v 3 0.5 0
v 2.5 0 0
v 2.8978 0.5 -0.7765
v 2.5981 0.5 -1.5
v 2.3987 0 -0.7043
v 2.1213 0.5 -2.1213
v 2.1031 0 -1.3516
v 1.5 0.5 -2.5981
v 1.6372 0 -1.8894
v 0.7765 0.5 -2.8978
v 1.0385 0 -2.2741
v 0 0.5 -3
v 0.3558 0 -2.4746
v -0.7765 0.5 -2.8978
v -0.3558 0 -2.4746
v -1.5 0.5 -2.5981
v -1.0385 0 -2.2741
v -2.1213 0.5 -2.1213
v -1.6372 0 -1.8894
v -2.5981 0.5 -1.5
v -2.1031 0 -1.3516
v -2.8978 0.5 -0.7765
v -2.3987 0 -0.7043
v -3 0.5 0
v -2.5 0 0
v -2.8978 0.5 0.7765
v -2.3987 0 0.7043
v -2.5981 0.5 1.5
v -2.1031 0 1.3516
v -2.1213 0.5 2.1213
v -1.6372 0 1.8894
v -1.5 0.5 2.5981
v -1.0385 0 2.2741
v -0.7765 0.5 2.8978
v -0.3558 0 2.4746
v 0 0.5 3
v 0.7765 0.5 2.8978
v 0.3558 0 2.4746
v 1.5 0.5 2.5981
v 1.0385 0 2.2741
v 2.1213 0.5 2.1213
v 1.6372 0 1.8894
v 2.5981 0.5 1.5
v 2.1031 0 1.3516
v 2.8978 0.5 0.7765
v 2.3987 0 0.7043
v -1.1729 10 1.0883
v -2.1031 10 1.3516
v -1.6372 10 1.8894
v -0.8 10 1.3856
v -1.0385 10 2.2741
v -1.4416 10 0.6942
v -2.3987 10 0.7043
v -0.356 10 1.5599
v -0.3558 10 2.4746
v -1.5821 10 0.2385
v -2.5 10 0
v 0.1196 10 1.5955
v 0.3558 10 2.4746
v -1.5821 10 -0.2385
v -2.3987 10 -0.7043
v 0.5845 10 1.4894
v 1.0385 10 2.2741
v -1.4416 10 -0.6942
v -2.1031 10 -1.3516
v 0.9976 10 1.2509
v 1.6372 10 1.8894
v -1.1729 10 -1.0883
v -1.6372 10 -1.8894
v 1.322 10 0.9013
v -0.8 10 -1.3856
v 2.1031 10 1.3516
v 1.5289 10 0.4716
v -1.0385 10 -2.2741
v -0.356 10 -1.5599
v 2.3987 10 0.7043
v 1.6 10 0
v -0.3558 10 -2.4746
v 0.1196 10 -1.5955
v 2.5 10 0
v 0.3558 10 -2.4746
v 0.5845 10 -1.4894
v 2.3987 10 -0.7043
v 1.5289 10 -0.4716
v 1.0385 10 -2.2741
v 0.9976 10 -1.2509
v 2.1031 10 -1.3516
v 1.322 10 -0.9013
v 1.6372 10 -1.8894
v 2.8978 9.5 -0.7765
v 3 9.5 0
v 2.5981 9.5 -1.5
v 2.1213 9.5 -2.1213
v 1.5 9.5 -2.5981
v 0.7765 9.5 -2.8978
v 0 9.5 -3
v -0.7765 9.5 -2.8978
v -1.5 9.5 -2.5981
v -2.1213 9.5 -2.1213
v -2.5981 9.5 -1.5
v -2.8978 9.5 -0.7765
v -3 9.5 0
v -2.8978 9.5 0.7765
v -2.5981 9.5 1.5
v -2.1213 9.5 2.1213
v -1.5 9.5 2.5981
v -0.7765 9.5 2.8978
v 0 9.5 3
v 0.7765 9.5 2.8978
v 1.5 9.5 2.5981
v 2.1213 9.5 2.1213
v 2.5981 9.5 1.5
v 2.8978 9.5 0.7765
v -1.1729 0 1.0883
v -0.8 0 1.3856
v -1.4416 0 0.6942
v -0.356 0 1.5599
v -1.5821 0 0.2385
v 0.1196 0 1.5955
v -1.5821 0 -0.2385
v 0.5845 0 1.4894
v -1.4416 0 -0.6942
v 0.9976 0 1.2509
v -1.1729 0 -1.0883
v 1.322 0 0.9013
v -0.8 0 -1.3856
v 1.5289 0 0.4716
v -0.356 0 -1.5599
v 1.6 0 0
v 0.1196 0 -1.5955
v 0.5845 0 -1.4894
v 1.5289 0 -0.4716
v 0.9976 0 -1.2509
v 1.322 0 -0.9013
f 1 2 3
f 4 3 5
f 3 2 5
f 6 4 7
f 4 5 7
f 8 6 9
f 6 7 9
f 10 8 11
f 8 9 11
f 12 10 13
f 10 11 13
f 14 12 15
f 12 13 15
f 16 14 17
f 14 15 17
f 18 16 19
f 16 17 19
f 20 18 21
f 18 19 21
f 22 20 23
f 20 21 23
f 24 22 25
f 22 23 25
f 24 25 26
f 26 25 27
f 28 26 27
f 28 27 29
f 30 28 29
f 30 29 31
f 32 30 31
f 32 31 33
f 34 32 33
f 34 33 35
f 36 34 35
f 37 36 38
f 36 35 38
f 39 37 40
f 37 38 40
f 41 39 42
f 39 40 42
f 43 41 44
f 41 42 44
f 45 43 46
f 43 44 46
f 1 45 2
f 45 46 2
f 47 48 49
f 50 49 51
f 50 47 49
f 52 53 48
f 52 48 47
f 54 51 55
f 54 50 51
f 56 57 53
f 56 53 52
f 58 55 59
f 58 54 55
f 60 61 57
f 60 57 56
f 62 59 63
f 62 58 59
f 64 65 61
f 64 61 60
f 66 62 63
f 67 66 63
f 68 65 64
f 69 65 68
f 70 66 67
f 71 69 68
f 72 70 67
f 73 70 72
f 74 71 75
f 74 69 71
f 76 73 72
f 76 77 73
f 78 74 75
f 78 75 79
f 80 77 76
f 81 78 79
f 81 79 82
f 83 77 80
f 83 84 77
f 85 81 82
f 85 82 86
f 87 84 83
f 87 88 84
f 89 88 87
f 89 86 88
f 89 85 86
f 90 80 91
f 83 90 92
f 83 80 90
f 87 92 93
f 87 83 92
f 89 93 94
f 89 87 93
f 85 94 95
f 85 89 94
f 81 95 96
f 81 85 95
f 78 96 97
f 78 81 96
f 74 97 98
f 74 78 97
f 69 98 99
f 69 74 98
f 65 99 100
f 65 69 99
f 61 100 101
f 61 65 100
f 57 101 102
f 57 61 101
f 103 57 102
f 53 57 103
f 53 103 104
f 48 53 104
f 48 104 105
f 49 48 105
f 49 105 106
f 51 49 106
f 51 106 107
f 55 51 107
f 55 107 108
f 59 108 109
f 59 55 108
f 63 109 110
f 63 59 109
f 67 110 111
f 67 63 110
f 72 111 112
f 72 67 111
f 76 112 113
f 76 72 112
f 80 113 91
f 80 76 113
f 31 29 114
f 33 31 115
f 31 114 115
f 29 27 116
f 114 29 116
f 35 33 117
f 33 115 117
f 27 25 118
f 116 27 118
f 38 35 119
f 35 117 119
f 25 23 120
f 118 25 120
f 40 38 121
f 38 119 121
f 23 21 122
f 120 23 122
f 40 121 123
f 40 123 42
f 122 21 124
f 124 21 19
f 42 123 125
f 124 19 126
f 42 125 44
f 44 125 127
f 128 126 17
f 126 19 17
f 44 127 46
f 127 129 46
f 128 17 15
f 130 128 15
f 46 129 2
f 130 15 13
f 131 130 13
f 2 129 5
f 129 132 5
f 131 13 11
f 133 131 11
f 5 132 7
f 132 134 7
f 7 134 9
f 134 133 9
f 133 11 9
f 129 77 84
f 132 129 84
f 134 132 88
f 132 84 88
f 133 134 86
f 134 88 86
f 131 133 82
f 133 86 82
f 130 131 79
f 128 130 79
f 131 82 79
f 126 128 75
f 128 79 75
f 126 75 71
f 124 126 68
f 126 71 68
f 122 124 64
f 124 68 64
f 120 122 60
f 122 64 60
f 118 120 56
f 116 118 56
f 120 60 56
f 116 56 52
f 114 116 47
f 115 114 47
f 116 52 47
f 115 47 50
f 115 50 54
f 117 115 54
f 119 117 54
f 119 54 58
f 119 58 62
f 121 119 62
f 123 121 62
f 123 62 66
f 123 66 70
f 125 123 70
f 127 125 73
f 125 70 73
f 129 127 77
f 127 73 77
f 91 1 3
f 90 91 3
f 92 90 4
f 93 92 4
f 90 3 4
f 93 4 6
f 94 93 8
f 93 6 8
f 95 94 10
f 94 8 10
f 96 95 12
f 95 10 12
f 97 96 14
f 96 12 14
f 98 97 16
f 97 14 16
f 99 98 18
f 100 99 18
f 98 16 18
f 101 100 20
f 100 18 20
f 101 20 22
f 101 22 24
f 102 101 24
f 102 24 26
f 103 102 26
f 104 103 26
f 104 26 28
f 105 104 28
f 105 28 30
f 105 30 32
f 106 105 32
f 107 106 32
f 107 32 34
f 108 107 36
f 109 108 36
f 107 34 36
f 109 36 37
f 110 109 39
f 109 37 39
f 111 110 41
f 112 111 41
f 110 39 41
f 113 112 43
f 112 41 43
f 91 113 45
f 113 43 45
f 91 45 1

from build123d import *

# Parameters (mm, degrees)
SKETCH1_R           = 3
BOSS_EXTRUDE1_DEPTH = 10
SKETCH2_R           = 1.6
CUT_EXTRUDE1_DEPTH  = 10
CHAMFER1_SIZE       = 0.5


with BuildPart() as part:
    # Sketch1 → Boss-Extrude1 (new body)
    with BuildSketch(Plane(origin=(0, 0, 0), x_dir=(1, 0, 0), z_dir=(0, 1, 0))):
        Circle(SKETCH1_R)
    extrude(amount=BOSS_EXTRUDE1_DEPTH)

    # Sketch2 → Cut-Extrude1 (cut)
    with BuildSketch(Plane(origin=(0, 10, 0), x_dir=(1, 0, 0), z_dir=(0, 1, 0))):
        Circle(SKETCH2_R)
    extrude(amount=-CUT_EXTRUDE1_DEPTH, mode=Mode.SUBTRACT)

    # Chamfer1
    chamfer1_edges = [part.edges().sort_by_distance(p)[0] for p in [
        (-3, 0, 0),
        (-3, 10, 0),
    ]]
    chamfer(chamfer1_edges, length=CHAMFER1_SIZE)


solid = part.part
